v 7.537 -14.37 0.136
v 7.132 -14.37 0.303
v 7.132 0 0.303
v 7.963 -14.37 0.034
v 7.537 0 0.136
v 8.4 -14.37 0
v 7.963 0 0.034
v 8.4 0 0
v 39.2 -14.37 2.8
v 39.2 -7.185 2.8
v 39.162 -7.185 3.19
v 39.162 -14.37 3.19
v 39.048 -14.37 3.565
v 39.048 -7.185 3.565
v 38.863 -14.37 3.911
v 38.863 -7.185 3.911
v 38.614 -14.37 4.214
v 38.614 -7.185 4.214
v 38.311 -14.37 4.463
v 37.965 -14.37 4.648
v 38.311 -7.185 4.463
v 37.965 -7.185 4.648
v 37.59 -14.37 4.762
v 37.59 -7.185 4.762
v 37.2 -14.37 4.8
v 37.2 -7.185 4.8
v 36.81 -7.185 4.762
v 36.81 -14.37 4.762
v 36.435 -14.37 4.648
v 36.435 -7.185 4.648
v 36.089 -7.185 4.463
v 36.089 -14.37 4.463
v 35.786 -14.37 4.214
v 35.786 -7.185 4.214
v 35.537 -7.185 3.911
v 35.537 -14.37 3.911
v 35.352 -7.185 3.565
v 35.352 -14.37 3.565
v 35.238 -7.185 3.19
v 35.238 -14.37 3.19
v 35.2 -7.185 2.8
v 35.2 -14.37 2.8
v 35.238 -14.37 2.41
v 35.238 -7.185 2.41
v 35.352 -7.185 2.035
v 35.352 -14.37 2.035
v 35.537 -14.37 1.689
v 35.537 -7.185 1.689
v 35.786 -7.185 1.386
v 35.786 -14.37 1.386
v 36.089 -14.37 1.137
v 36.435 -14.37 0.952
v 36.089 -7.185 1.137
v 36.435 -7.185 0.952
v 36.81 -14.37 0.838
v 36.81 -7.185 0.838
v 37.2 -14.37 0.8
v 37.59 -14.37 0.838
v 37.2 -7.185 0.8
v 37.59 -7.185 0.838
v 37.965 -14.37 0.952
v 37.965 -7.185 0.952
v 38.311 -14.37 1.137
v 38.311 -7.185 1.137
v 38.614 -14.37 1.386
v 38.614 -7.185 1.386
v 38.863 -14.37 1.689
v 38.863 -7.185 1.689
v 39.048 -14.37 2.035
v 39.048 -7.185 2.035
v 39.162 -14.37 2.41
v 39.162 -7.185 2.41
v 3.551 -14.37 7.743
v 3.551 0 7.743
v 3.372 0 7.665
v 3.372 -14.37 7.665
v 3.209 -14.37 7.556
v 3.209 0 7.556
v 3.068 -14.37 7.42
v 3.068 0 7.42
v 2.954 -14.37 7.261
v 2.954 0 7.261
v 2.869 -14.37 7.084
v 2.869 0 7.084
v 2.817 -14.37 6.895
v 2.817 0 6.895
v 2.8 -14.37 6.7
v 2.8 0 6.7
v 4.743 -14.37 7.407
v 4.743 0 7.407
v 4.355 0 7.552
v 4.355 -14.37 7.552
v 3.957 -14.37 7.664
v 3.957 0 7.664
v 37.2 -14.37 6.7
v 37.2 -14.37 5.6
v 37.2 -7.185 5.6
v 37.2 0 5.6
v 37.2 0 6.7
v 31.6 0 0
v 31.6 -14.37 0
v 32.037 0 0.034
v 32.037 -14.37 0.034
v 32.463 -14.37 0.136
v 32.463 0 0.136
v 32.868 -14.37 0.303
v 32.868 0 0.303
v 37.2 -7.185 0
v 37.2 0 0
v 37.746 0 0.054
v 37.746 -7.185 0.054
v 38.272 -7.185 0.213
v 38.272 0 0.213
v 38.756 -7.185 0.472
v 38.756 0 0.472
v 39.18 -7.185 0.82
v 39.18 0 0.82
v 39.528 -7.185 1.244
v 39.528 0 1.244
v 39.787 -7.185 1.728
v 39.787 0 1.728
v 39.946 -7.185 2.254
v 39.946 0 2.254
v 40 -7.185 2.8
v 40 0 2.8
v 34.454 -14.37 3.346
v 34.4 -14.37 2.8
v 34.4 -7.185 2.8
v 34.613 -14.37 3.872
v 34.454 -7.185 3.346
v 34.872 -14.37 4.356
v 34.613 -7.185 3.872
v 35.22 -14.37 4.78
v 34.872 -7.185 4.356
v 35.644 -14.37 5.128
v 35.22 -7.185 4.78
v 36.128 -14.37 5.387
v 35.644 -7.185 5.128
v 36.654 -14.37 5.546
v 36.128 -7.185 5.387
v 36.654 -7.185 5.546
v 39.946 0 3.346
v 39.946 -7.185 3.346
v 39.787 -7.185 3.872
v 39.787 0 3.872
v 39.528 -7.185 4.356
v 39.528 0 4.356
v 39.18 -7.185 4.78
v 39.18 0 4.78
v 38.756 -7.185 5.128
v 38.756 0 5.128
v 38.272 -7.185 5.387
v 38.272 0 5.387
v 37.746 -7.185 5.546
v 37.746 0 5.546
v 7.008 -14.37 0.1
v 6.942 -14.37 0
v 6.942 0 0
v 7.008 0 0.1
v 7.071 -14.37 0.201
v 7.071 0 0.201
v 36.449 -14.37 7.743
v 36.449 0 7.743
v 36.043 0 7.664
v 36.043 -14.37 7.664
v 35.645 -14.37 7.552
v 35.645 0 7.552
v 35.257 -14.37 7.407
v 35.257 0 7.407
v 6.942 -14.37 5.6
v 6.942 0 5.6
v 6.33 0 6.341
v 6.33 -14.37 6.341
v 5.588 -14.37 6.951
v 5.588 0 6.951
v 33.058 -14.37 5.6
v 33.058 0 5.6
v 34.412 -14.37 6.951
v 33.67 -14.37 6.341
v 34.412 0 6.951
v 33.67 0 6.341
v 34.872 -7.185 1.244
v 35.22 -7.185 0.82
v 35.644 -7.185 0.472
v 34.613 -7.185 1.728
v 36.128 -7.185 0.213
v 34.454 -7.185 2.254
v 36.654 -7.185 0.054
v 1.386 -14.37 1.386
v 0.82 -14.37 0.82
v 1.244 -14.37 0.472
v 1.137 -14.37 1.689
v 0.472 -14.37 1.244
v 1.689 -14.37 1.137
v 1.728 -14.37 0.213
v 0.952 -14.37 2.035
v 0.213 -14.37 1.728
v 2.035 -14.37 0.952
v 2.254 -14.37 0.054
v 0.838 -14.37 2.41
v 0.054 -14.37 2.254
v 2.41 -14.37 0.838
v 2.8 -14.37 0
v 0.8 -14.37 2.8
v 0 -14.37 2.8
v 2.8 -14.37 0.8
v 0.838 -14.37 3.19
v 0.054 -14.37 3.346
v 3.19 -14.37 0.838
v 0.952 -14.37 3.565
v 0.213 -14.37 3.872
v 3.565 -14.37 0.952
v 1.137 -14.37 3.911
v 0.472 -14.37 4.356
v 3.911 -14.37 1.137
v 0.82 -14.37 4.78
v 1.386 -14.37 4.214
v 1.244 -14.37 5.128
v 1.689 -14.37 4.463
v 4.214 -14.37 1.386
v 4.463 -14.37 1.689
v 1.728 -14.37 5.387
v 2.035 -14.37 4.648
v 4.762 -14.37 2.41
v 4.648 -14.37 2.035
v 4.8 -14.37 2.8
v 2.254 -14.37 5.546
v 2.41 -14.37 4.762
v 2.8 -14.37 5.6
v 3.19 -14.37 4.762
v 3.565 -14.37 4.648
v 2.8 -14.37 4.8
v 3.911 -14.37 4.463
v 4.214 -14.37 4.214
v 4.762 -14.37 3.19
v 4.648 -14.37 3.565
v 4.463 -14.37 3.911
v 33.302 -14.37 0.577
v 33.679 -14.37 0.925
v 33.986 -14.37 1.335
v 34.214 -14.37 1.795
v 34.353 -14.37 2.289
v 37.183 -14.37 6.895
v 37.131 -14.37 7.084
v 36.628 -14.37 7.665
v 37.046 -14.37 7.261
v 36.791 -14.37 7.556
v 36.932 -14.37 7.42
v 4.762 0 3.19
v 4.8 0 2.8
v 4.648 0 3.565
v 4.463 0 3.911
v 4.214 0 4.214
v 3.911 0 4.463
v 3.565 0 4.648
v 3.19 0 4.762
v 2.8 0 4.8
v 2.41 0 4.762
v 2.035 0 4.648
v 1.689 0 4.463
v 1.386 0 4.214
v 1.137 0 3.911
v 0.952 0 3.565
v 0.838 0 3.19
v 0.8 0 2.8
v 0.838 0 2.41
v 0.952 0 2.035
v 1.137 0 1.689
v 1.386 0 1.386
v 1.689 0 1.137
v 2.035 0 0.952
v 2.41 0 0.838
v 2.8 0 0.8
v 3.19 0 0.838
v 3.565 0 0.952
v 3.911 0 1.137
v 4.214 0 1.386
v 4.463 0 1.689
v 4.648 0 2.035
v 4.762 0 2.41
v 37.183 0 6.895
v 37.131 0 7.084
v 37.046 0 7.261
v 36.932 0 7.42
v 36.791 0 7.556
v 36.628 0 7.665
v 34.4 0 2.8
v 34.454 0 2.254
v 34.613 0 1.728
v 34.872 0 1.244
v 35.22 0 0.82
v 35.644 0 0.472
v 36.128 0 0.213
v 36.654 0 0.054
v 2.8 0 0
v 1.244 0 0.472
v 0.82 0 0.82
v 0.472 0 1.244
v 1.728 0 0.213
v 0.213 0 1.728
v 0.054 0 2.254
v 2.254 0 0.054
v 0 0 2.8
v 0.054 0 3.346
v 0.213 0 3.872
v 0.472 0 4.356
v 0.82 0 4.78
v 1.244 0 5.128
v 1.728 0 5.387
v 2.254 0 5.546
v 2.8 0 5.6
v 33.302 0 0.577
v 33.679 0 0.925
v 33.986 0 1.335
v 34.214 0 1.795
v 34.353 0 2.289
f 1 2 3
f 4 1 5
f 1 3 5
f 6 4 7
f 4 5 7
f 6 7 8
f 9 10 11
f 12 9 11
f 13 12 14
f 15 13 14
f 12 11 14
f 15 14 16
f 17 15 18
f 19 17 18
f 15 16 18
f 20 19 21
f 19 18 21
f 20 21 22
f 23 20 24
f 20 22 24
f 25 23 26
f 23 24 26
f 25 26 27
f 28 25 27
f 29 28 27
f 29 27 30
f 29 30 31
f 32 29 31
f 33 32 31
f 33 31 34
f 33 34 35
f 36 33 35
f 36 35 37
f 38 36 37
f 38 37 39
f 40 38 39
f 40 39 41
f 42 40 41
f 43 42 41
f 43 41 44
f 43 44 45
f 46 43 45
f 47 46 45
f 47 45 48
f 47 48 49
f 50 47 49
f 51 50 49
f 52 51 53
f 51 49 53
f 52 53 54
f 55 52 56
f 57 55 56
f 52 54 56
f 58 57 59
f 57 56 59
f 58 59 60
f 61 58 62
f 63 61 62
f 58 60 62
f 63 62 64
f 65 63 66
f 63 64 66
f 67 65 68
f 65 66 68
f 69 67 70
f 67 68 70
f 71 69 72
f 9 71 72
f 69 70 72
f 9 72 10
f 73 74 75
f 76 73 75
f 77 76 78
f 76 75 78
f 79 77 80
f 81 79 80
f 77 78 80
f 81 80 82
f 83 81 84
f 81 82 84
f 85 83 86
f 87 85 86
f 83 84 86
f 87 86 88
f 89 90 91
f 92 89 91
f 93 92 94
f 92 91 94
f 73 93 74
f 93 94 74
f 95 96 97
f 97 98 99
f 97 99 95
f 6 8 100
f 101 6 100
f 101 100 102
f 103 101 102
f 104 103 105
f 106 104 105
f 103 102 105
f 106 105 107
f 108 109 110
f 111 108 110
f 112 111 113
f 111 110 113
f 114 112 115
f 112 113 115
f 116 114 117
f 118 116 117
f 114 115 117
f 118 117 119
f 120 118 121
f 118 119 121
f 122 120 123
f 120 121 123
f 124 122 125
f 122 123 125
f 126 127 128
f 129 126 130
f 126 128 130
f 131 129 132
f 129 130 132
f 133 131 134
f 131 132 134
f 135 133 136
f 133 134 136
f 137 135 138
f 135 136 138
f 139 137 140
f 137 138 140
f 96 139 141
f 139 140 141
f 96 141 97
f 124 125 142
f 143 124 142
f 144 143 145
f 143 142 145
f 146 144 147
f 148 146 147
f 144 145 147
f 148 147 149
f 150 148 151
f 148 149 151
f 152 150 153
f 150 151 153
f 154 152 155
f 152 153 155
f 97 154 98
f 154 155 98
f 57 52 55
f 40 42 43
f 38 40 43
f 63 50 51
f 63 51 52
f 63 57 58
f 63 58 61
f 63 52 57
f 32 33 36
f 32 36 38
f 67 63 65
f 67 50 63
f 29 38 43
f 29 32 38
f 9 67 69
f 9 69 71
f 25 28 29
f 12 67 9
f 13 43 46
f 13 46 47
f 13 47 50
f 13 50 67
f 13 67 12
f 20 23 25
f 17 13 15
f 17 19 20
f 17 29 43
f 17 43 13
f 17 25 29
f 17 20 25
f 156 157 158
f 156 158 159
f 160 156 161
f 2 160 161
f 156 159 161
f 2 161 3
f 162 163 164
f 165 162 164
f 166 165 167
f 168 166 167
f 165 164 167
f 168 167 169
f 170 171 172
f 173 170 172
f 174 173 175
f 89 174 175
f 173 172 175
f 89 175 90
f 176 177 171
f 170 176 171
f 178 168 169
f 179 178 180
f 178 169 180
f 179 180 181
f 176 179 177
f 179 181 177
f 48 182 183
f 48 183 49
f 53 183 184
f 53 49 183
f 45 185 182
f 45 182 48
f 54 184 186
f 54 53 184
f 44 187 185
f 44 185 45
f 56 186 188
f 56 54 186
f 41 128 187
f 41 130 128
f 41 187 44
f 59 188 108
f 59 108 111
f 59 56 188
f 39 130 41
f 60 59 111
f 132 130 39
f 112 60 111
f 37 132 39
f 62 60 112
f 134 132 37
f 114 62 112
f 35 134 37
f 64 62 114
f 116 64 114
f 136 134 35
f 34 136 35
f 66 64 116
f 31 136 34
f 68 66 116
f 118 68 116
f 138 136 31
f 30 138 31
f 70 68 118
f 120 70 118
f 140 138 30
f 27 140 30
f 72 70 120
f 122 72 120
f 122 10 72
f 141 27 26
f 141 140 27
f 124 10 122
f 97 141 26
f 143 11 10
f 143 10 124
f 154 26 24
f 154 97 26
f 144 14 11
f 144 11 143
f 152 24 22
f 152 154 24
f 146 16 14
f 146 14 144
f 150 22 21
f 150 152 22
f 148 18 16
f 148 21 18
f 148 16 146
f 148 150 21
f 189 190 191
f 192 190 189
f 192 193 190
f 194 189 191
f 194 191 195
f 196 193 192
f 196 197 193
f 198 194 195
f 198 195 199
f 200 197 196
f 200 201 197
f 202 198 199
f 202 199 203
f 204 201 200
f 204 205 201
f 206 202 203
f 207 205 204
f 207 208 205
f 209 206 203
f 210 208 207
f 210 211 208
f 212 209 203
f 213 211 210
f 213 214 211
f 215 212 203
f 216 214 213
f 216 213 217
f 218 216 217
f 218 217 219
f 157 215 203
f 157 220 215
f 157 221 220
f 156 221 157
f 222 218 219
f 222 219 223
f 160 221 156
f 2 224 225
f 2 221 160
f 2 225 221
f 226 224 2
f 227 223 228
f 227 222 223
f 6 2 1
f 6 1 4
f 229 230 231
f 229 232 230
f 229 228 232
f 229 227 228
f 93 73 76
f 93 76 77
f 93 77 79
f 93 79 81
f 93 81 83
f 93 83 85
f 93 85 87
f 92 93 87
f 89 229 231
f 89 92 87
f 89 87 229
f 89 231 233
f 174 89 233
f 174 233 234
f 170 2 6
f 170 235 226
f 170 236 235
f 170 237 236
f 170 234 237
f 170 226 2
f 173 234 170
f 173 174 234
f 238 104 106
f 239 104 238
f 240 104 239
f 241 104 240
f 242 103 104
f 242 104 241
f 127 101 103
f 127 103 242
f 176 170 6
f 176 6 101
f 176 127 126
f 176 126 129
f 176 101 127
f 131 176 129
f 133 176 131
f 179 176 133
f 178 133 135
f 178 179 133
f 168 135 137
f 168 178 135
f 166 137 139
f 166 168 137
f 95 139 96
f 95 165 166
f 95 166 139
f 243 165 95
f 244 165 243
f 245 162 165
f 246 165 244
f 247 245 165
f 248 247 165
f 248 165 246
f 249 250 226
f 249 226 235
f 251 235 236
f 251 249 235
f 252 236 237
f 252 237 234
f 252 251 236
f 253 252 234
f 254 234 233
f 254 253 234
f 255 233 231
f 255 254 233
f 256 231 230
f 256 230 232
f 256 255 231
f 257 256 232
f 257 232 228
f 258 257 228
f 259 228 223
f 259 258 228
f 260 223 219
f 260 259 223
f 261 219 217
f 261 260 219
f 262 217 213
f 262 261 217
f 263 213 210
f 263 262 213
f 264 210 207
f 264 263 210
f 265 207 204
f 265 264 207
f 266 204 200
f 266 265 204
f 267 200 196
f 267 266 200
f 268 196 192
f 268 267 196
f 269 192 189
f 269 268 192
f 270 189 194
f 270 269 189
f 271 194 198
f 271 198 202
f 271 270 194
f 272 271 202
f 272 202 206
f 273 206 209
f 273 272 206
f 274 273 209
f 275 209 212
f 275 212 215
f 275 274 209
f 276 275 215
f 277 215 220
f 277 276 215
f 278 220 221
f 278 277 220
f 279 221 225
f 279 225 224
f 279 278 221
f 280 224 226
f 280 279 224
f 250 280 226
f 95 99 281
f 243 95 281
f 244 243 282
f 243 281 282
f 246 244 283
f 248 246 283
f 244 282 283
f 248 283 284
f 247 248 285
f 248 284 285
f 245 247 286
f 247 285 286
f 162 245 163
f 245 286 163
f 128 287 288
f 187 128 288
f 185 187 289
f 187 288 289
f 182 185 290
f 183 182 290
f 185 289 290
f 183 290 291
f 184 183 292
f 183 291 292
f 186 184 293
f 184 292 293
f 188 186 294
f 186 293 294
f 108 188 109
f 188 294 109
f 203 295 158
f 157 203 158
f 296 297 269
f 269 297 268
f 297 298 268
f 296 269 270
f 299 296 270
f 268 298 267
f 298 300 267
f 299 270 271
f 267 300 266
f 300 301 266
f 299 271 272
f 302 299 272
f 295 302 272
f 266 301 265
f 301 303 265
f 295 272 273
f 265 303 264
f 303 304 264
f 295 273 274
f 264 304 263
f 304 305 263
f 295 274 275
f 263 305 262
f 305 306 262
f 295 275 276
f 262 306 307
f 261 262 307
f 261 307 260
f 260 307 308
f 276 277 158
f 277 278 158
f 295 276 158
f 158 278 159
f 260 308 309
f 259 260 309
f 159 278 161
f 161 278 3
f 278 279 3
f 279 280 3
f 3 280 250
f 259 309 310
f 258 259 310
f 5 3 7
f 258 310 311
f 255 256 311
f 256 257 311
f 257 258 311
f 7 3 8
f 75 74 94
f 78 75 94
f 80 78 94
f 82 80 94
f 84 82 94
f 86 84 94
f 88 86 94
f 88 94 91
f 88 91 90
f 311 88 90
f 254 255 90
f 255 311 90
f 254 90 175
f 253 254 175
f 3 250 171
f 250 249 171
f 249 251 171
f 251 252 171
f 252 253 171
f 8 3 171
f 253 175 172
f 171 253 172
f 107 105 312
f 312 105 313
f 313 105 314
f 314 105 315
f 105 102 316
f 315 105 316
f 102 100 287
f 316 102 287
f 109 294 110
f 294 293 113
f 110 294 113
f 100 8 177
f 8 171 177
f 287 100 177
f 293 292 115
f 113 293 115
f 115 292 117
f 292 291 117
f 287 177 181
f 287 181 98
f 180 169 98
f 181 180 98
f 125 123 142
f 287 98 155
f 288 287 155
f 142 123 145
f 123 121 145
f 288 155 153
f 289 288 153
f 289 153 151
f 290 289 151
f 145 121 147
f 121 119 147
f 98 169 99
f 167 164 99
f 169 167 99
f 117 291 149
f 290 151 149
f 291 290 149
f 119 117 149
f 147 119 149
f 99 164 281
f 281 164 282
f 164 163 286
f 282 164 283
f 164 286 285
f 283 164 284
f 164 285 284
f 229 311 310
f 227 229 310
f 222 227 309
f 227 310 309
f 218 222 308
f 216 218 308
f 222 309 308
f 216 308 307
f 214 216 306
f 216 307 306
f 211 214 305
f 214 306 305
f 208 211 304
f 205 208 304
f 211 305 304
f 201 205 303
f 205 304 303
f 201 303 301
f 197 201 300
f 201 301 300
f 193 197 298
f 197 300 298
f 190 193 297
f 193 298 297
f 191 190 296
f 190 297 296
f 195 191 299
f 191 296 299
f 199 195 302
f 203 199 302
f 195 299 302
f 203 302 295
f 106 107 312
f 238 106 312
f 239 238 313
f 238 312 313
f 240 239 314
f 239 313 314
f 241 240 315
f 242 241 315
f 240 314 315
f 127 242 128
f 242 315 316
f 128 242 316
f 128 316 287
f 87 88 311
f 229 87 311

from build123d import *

# Parameters (mm, degrees)
F1_DEPTH = 14.37
F0_R     = 2
F2_DEPTH = 7.185
F3_DEPTH = 14.37


with BuildPart() as f1:
    # F0 (on Front) → F1 (new body)
    with BuildSketch(Plane.XZ):
        with BuildLine():
            Line((3.9000000034, 5.6), (2.8, 5.6))
            ThreePointArc((2.8, 5.6), (4.7798989873, 4.7798989873), (5.6, 2.8))
            ThreePointArc((5.6, 2.8), (6.0135800872, 1.3354181484), (7.1321428571, 0.3034947896))
            ThreePointArc((7.1321428571, 0.3034947896), (7.7481620558, 0.0769305381), (8.4, 0))
            Line((8.4, 0), (31.6, 0))
            ThreePointArc((31.6, 0), (32.2518379442, 0.0769305381), (32.8678571429, 0.3034947896))
            ThreePointArc((32.8678571429, 0.3034947896), (33.9864199128, 1.3354181484), (34.4, 2.8))
            ThreePointArc((34.4, 2.8), (35.2201010127, 4.7798989873), (37.2, 5.6))
            Line((37.2, 5.6), (37.2, 6.7))
            ThreePointArc((37.2, 6.7), (36.8778174593, 5.9221825407), (36.1, 5.6))
            Line((36.1, 5.6), (33.0575369646, 5.6))
            Line((33.0575369646, 5.6), (6.9424630354, 5.6))
            Line((6.9424630354, 5.6), (3.9000000034, 5.6))
        make_face()
        with BuildLine():
            ThreePointArc((35.2574998019, 7.4072435339), (34.0261653027, 6.6635182559), (33.0575369646, 5.6))
            Line((33.0575369646, 5.6), (36.1, 5.6))
            ThreePointArc((36.1, 5.6), (35.103012566, 6.2352247249), (35.2574998019, 7.4072435339))
        make_face()
        with BuildLine():
            ThreePointArc((35.2574998019, 7.4072435339), (35.103012566, 6.2352247249), (36.1, 5.6))
            ThreePointArc((36.1, 5.6), (36.8778174593, 5.9221825407), (37.2, 6.7))
            ThreePointArc((37.2, 6.7), (36.9926506427, 7.3427867688), (36.4487730361, 7.7432436768))
            ThreePointArc((36.4487730361, 7.7432436768), (35.8426991749, 7.6122483799), (35.2574998019, 7.4072435339))
        make_face()
        with BuildLine():
            ThreePointArc((4.7425001981, 7.4072435339), (4.8969874348, 6.2352247264), (3.9000000034, 5.6))
            Line((3.9000000034, 5.6), (6.9424630354, 5.6))
            ThreePointArc((6.9424630354, 5.6), (5.9738346973, 6.6635182559), (4.7425001981, 7.4072435339))
        make_face()
        with BuildLine():
            ThreePointArc((2.8, 6.7), (3.1221825419, 5.9221825395), (3.9000000034, 5.6))
            ThreePointArc((3.9000000034, 5.6), (4.8969874348, 6.2352247264), (4.7425001981, 7.4072435339))
            ThreePointArc((4.7425001981, 7.4072435339), (4.1573008251, 7.6122483799), (3.5512269639, 7.7432436768))
            ThreePointArc((3.5512269639, 7.7432436768), (3.0073493573, 7.3427867688), (2.8, 6.7))
        make_face()
        with BuildLine():
            Line((2.8, 6.7), (2.8, 5.6))
            Line((2.8, 5.6), (3.9000000034, 5.6))
            ThreePointArc((3.9000000034, 5.6), (3.1221825419, 5.9221825395), (2.8, 6.7))
        make_face()
    extrude(amount=F1_DEPTH)



with BuildPart() as f1b:
    # F0 (on Front) → F1, piece 2 (new body)
    with BuildSketch(Plane.XZ):
        with Locations((37.2, 2.8)):
            Circle(F0_R)
    extrude(amount=F1_DEPTH)


with BuildPart() as f1_1:
    add(f1.part)

    add(f1b.part)  # F2 merges F1b
    # F0 (on Front) → F2 (join)
    with BuildSketch(Plane.XZ):
        with BuildLine():
            ThreePointArc((34.4, 2.8), (35.2201010127, 0.8201010127), (37.2, 0))
            ThreePointArc((37.2, 0), (39.1798989873, 0.8201010127), (40, 2.8))
            ThreePointArc((40, 2.8), (39.1798989873, 4.7798989873), (37.2, 5.6))
            ThreePointArc((37.2, 5.6), (35.2201010127, 4.7798989873), (34.4, 2.8))
        make_face()
        with Locations((37.2, 2.8)):
            Circle(F0_R, mode=Mode.SUBTRACT)
    extrude(amount=F2_DEPTH)

    # F0 (on Front) → F3 (join)
    with BuildSketch(Plane.XZ):
        with BuildLine():
            ThreePointArc((5.6, 2.8), (4.7798989873, 0.8201010127), (2.8, 0))
            Line((2.8, 0), (6.9424630354, 0))
            ThreePointArc((6.9424630354, 0), (7.0400192842, 0.1500497232), (7.1321428571, 0.3034947896))
            ThreePointArc((7.1321428571, 0.3034947896), (6.0135800872, 1.3354181484), (5.6, 2.8))
        make_face()
        with BuildLine():
            ThreePointArc((2.8, 5.6), (0, 2.8), (2.8, 0))
            ThreePointArc((2.8, 0), (4.7798989873, 0.8201010127), (5.6, 2.8))
            ThreePointArc((5.6, 2.8), (4.7798989873, 4.7798989873), (2.8, 5.6))
        make_face()
        with Locations((2.8, 2.8)):
            Circle(F0_R, mode=Mode.SUBTRACT)
    extrude(amount=F3_DEPTH)


solid = f1_1.part
